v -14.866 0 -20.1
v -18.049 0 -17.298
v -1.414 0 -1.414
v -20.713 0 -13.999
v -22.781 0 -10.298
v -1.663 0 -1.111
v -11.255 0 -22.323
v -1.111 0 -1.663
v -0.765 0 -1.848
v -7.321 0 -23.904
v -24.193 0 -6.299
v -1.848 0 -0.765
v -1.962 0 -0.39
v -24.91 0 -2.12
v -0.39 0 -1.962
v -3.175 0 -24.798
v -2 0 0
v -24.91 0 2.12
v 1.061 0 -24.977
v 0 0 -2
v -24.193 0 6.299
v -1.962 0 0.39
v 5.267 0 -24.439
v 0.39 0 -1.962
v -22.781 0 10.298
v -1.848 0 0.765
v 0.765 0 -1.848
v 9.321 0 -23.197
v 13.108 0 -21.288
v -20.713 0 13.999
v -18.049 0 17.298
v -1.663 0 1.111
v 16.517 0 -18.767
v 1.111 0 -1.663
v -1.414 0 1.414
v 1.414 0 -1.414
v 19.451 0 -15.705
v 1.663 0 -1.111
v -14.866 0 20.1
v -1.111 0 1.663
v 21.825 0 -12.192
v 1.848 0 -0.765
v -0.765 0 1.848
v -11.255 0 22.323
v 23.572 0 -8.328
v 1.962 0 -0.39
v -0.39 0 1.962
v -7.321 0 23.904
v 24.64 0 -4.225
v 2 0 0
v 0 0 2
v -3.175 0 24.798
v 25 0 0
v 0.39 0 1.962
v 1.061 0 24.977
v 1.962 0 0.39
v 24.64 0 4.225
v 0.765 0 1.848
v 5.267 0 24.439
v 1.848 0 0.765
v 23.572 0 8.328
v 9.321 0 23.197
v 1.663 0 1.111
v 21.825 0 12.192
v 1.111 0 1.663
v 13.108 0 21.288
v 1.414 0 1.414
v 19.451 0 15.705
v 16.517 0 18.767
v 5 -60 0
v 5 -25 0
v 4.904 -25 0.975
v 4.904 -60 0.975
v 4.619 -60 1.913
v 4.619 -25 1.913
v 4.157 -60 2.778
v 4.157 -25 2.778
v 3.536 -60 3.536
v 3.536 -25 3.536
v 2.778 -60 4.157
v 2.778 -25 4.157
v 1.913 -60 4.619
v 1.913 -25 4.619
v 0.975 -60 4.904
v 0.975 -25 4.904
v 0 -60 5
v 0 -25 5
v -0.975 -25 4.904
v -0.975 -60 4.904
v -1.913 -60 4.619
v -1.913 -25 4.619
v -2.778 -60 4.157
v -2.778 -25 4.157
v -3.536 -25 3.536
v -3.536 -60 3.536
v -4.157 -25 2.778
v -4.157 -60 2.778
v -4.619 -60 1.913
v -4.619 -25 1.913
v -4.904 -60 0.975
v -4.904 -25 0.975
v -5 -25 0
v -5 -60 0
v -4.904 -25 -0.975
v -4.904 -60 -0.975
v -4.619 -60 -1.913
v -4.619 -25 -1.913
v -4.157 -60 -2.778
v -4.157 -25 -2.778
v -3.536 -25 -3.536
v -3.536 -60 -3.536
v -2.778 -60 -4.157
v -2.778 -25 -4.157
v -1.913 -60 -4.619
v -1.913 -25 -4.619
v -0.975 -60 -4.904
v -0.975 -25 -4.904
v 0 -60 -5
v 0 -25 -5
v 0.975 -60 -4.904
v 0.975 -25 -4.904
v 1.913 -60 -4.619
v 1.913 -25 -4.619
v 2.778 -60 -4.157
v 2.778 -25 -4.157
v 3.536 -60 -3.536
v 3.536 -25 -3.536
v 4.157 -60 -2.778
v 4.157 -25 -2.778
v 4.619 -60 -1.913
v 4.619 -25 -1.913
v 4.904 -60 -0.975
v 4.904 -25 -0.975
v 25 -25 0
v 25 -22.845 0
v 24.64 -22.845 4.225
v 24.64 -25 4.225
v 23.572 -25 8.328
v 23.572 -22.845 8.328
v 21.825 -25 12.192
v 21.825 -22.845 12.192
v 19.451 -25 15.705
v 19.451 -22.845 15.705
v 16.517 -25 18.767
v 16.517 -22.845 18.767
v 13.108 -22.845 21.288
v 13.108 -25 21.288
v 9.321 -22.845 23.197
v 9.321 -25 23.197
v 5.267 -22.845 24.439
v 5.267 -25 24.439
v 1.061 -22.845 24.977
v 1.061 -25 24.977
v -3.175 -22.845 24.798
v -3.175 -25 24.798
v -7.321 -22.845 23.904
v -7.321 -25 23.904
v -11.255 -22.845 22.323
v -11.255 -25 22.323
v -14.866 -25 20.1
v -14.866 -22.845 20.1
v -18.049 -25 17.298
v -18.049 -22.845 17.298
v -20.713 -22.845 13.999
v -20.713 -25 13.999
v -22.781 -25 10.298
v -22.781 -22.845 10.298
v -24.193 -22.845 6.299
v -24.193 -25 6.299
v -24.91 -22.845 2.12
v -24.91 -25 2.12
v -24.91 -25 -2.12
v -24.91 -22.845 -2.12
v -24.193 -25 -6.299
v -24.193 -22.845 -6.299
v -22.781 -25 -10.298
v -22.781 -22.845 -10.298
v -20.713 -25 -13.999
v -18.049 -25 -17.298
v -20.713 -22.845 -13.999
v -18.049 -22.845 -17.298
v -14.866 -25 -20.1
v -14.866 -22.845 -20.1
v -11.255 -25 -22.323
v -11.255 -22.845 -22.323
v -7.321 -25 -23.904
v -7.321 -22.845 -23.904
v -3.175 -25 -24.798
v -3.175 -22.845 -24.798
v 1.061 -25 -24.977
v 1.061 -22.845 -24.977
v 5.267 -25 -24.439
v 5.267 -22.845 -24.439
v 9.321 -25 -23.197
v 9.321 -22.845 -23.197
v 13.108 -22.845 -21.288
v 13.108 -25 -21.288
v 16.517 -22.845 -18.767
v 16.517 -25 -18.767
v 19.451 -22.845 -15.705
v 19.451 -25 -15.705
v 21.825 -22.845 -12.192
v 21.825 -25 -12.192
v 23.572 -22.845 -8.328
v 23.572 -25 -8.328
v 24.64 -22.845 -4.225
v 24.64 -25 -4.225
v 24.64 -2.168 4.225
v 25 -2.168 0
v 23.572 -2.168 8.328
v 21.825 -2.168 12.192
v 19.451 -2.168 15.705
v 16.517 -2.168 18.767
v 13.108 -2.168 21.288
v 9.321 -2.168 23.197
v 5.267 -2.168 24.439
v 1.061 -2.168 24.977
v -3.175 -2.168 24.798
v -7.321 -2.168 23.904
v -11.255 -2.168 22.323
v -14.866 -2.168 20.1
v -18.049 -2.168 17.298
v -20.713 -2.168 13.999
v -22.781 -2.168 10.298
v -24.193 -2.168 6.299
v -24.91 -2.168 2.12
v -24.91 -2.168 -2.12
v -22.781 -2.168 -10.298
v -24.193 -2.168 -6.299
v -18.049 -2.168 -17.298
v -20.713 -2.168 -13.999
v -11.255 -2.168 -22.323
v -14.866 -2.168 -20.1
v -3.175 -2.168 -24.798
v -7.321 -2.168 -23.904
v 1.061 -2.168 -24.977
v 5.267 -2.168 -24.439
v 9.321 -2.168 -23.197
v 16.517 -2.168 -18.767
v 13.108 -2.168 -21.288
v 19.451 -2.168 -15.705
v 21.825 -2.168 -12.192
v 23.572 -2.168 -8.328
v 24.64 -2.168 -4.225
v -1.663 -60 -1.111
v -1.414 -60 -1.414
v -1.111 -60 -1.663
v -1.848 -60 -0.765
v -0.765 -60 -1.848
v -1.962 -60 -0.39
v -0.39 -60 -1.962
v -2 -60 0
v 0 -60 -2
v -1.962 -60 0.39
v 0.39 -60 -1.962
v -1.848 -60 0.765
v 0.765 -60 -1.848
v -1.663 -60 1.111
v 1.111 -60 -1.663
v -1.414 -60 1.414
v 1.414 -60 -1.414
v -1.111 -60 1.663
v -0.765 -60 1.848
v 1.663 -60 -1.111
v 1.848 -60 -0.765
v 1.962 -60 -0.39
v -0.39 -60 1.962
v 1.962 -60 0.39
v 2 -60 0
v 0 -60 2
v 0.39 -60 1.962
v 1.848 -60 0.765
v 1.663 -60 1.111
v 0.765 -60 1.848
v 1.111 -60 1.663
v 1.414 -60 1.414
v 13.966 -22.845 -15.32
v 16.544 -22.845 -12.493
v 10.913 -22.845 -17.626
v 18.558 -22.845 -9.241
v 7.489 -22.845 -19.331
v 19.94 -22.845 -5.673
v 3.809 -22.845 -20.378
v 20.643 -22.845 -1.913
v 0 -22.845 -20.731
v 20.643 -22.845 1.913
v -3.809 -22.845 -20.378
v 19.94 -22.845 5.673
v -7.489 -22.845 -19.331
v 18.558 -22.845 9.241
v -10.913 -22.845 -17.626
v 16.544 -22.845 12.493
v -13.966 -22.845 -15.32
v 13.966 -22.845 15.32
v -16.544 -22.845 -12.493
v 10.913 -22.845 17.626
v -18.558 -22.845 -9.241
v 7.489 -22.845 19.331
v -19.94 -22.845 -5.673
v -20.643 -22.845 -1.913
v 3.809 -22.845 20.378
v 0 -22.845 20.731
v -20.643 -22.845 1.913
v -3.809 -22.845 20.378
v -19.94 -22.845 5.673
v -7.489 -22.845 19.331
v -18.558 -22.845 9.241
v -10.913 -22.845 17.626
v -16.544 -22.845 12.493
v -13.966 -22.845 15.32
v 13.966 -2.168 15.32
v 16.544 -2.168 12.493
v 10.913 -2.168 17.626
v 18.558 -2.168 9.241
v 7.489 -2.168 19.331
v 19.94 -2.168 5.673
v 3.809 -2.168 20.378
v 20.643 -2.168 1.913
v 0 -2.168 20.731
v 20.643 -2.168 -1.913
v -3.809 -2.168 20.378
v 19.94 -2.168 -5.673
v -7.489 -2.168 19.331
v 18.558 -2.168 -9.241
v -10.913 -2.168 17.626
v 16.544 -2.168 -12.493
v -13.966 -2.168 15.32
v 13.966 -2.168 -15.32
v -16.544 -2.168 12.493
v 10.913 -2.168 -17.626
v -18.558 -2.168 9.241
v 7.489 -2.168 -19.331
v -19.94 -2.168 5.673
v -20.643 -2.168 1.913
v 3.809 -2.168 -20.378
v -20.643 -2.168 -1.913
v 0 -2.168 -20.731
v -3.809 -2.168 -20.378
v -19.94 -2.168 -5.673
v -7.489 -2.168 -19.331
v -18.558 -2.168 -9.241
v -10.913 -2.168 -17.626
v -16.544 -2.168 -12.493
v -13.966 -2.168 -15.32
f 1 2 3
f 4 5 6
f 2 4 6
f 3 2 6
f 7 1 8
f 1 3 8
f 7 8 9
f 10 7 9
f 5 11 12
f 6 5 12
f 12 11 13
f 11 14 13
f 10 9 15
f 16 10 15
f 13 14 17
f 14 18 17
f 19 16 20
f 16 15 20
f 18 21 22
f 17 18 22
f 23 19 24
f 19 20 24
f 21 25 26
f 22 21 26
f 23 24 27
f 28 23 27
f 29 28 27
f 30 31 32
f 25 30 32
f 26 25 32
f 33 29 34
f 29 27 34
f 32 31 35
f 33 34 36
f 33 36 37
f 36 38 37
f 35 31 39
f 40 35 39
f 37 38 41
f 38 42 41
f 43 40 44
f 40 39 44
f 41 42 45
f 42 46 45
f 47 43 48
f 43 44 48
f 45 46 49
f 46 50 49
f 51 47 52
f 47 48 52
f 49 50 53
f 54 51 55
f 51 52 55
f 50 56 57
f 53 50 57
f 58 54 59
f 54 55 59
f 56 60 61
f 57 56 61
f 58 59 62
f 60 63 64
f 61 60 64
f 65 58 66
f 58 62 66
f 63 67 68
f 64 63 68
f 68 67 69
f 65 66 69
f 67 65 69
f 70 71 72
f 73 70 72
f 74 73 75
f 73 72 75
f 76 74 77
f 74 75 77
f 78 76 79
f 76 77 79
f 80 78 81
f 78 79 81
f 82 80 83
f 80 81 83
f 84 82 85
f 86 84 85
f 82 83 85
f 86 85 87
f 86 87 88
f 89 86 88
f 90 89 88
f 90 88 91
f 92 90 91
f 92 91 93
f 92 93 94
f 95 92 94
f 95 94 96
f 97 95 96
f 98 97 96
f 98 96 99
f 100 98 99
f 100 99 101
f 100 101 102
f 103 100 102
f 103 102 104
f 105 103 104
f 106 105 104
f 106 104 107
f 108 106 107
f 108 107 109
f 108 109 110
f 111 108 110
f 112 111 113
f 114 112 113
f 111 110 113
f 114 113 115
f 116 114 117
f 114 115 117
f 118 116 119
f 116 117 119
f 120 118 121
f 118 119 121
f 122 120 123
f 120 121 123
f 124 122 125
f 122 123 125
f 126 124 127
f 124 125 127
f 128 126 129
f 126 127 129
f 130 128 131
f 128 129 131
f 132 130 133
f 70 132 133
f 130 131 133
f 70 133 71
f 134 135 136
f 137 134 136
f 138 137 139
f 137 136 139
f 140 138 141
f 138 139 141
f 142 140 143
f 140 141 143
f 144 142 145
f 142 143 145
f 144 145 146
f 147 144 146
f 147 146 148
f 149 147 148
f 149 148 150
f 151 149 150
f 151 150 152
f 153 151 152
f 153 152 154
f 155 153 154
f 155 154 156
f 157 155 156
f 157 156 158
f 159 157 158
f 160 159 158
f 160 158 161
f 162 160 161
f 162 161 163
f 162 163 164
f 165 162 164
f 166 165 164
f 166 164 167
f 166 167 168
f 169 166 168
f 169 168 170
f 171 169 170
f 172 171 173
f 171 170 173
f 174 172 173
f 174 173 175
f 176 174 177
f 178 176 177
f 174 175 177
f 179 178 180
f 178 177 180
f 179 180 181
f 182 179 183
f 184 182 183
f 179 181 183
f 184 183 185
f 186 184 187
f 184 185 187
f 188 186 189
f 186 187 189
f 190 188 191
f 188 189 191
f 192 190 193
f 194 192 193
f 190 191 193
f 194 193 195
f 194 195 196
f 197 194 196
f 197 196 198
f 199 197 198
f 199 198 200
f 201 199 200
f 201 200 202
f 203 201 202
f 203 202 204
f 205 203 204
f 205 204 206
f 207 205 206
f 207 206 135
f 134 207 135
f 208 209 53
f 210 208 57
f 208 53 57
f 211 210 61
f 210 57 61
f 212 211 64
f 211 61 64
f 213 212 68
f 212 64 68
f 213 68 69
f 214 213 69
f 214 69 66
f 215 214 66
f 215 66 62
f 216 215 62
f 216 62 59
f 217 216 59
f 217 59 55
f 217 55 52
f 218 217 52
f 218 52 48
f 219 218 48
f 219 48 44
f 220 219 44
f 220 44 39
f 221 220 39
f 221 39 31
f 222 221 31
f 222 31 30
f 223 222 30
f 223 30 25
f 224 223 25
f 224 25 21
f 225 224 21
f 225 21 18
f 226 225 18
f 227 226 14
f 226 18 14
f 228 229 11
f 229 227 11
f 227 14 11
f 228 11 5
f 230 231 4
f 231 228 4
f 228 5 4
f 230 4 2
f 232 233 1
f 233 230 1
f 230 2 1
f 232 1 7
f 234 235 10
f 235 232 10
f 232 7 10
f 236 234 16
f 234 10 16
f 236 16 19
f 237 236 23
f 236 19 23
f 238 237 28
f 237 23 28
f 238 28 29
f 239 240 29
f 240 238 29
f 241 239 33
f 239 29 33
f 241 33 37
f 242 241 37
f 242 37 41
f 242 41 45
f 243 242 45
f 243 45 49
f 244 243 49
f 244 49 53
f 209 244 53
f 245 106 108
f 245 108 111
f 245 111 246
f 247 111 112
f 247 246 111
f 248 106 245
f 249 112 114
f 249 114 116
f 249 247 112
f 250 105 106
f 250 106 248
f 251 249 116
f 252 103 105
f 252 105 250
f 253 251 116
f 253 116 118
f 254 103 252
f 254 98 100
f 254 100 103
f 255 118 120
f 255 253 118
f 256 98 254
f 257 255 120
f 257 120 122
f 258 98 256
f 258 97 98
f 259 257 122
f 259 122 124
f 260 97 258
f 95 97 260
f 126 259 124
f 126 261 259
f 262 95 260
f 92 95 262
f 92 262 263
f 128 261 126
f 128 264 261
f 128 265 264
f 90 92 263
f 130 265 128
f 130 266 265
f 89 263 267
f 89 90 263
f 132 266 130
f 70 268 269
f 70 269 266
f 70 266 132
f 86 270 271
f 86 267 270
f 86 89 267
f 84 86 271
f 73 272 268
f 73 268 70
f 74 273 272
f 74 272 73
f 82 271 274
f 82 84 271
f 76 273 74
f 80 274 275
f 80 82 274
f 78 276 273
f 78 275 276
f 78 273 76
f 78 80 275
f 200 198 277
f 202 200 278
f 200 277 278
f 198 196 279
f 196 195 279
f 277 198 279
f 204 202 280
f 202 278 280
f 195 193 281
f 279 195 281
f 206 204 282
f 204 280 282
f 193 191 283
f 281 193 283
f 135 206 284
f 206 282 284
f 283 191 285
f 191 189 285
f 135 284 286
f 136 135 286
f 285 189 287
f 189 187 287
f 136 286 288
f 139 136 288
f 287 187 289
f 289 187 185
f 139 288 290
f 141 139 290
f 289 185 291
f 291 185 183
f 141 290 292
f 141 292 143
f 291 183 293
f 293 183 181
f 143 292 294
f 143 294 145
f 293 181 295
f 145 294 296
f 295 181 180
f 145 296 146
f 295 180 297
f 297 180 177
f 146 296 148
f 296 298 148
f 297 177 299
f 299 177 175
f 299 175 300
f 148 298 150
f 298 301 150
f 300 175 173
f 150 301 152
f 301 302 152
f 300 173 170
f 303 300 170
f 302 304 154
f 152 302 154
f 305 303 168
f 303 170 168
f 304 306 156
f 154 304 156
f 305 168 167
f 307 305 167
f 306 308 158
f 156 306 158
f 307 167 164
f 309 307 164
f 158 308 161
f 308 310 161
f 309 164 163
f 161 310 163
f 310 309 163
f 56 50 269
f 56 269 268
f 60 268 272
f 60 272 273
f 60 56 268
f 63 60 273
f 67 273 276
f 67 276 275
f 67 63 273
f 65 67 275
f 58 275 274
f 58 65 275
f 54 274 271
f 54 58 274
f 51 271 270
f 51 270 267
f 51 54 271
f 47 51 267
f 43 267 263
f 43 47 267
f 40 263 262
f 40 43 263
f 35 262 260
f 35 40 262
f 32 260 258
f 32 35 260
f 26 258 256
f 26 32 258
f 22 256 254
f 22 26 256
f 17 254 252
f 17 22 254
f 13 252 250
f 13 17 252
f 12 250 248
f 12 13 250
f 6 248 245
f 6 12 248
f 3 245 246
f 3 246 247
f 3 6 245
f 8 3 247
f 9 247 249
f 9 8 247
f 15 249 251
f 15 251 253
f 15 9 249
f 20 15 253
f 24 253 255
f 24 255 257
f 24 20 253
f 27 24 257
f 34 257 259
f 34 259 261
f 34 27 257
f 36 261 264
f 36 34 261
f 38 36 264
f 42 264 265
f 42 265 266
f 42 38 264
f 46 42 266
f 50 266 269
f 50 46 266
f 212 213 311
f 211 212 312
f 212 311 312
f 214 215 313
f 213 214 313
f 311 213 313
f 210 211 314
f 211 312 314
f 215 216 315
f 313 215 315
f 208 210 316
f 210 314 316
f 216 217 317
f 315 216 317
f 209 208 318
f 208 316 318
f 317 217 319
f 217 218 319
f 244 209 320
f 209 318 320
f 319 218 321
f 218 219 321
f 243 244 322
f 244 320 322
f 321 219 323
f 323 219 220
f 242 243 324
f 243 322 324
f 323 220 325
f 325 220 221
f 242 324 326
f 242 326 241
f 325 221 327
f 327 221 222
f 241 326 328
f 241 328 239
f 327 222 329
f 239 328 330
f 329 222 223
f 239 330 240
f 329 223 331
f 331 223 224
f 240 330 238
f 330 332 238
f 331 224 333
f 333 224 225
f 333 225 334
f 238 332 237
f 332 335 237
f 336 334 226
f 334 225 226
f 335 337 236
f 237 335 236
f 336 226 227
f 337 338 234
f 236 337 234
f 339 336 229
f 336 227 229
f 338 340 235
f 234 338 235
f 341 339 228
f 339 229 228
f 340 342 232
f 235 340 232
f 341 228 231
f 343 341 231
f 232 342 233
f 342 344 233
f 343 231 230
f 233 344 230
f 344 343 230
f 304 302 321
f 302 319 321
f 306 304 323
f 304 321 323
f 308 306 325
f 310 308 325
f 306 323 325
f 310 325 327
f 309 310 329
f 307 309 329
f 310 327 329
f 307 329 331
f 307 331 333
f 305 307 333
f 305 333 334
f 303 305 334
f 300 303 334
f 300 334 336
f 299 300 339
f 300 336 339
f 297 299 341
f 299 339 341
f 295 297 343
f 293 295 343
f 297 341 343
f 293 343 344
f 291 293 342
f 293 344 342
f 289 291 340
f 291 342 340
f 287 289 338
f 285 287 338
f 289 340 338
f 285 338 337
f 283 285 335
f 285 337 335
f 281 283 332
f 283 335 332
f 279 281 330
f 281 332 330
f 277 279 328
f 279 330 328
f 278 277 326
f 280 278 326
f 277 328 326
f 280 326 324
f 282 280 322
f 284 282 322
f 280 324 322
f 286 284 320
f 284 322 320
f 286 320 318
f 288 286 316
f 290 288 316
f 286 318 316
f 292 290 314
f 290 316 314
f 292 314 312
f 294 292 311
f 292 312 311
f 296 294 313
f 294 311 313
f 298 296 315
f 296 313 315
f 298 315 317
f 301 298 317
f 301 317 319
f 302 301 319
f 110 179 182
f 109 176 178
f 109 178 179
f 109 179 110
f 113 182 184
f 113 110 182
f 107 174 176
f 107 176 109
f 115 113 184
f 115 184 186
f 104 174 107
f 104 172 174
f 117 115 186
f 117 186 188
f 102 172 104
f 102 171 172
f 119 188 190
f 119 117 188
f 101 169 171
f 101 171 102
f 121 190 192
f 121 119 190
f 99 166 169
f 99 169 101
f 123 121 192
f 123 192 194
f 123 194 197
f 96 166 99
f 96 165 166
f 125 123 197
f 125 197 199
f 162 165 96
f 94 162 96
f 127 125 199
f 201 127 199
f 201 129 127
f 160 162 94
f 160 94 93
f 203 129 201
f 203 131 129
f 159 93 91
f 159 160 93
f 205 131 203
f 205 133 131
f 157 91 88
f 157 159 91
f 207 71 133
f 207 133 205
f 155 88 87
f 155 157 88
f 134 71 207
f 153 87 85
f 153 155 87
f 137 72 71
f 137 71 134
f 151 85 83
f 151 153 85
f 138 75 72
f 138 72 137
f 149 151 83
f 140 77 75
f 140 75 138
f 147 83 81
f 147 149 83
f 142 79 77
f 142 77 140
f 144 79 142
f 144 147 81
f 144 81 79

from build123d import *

# Parameters (mm, degrees)
F0_R     = 25
F0_R_2   = 5
F1_DEPTH = 25
F0_R_3   = 2
F2_DEPTH = 60


with BuildPart() as f1:
    # F0 (on Front) → F1 (new body)
    with BuildSketch(Plane.XZ):
        Circle(F0_R)
        Circle(F0_R_2, mode=Mode.SUBTRACT)
    extrude(amount=F1_DEPTH)

    # F0 (on Front) → F2 (join)
    with BuildSketch(Plane.XZ):
        Circle(F0_R_2)
        Circle(F0_R_3, mode=Mode.SUBTRACT)
    extrude(amount=F2_DEPTH)

    # F3 (on Right) → F4 (revolve, cut)
    with BuildSketch(Plane.YZ):
        Polygon((-2.168103, 20.730987), (-2.168103, 26.635021), (-22.844952, 26.710875), (-22.844952, 20.730987), align=None)
    revolve(axis=Axis((0, -34.338176, 0), (0, -1, 0)), mode=Mode.SUBTRACT)


solid = f1.part
